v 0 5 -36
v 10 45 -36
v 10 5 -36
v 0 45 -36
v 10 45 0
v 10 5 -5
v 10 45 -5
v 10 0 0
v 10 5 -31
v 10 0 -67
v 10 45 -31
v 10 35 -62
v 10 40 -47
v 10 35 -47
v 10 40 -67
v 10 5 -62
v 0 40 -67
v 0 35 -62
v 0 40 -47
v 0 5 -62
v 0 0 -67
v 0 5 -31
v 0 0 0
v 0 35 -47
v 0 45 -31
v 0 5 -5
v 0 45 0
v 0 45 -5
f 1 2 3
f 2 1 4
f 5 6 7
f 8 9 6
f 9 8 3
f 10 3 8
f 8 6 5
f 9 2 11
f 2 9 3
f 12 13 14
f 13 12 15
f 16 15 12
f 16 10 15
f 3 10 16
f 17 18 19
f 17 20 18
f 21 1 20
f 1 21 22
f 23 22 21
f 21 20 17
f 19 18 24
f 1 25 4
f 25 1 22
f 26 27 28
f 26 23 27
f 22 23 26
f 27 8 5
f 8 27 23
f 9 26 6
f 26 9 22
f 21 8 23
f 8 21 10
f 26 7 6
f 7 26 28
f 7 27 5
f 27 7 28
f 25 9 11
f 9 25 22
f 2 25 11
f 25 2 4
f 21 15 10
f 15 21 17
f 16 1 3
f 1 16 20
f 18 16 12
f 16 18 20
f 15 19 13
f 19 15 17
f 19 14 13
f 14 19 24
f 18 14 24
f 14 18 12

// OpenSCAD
$fn = 40;
plate_width = 26;
thickness = 5;
clamp_length = 40;
hook_length = 15;


rotate([0, 90, 0]){
    
    
cube([plate_width+(thickness*2), thickness, thickness*2]);
//cube([plate_width*2+thickness, thickness,thickness]);

translate([0, thickness, 0]) cube([thickness, clamp_length, thickness*2]);
    
translate([plate_width+thickness, thickness, 0]) cube([thickness, clamp_length, thickness*2]);
 

translate([(plate_width+thickness), 0, 0]) cube([plate_width+(thickness*2), thickness,thickness*2]);

translate([(plate_width+thickness)*2, 0, 0]) cube([thickness, clamp_length, thickness*2]);
//hook
translate([(plate_width*2+thickness*2-hook_length), clamp_length-thickness, 0]) cube([hook_length, thickness, thickness*2]);

}
